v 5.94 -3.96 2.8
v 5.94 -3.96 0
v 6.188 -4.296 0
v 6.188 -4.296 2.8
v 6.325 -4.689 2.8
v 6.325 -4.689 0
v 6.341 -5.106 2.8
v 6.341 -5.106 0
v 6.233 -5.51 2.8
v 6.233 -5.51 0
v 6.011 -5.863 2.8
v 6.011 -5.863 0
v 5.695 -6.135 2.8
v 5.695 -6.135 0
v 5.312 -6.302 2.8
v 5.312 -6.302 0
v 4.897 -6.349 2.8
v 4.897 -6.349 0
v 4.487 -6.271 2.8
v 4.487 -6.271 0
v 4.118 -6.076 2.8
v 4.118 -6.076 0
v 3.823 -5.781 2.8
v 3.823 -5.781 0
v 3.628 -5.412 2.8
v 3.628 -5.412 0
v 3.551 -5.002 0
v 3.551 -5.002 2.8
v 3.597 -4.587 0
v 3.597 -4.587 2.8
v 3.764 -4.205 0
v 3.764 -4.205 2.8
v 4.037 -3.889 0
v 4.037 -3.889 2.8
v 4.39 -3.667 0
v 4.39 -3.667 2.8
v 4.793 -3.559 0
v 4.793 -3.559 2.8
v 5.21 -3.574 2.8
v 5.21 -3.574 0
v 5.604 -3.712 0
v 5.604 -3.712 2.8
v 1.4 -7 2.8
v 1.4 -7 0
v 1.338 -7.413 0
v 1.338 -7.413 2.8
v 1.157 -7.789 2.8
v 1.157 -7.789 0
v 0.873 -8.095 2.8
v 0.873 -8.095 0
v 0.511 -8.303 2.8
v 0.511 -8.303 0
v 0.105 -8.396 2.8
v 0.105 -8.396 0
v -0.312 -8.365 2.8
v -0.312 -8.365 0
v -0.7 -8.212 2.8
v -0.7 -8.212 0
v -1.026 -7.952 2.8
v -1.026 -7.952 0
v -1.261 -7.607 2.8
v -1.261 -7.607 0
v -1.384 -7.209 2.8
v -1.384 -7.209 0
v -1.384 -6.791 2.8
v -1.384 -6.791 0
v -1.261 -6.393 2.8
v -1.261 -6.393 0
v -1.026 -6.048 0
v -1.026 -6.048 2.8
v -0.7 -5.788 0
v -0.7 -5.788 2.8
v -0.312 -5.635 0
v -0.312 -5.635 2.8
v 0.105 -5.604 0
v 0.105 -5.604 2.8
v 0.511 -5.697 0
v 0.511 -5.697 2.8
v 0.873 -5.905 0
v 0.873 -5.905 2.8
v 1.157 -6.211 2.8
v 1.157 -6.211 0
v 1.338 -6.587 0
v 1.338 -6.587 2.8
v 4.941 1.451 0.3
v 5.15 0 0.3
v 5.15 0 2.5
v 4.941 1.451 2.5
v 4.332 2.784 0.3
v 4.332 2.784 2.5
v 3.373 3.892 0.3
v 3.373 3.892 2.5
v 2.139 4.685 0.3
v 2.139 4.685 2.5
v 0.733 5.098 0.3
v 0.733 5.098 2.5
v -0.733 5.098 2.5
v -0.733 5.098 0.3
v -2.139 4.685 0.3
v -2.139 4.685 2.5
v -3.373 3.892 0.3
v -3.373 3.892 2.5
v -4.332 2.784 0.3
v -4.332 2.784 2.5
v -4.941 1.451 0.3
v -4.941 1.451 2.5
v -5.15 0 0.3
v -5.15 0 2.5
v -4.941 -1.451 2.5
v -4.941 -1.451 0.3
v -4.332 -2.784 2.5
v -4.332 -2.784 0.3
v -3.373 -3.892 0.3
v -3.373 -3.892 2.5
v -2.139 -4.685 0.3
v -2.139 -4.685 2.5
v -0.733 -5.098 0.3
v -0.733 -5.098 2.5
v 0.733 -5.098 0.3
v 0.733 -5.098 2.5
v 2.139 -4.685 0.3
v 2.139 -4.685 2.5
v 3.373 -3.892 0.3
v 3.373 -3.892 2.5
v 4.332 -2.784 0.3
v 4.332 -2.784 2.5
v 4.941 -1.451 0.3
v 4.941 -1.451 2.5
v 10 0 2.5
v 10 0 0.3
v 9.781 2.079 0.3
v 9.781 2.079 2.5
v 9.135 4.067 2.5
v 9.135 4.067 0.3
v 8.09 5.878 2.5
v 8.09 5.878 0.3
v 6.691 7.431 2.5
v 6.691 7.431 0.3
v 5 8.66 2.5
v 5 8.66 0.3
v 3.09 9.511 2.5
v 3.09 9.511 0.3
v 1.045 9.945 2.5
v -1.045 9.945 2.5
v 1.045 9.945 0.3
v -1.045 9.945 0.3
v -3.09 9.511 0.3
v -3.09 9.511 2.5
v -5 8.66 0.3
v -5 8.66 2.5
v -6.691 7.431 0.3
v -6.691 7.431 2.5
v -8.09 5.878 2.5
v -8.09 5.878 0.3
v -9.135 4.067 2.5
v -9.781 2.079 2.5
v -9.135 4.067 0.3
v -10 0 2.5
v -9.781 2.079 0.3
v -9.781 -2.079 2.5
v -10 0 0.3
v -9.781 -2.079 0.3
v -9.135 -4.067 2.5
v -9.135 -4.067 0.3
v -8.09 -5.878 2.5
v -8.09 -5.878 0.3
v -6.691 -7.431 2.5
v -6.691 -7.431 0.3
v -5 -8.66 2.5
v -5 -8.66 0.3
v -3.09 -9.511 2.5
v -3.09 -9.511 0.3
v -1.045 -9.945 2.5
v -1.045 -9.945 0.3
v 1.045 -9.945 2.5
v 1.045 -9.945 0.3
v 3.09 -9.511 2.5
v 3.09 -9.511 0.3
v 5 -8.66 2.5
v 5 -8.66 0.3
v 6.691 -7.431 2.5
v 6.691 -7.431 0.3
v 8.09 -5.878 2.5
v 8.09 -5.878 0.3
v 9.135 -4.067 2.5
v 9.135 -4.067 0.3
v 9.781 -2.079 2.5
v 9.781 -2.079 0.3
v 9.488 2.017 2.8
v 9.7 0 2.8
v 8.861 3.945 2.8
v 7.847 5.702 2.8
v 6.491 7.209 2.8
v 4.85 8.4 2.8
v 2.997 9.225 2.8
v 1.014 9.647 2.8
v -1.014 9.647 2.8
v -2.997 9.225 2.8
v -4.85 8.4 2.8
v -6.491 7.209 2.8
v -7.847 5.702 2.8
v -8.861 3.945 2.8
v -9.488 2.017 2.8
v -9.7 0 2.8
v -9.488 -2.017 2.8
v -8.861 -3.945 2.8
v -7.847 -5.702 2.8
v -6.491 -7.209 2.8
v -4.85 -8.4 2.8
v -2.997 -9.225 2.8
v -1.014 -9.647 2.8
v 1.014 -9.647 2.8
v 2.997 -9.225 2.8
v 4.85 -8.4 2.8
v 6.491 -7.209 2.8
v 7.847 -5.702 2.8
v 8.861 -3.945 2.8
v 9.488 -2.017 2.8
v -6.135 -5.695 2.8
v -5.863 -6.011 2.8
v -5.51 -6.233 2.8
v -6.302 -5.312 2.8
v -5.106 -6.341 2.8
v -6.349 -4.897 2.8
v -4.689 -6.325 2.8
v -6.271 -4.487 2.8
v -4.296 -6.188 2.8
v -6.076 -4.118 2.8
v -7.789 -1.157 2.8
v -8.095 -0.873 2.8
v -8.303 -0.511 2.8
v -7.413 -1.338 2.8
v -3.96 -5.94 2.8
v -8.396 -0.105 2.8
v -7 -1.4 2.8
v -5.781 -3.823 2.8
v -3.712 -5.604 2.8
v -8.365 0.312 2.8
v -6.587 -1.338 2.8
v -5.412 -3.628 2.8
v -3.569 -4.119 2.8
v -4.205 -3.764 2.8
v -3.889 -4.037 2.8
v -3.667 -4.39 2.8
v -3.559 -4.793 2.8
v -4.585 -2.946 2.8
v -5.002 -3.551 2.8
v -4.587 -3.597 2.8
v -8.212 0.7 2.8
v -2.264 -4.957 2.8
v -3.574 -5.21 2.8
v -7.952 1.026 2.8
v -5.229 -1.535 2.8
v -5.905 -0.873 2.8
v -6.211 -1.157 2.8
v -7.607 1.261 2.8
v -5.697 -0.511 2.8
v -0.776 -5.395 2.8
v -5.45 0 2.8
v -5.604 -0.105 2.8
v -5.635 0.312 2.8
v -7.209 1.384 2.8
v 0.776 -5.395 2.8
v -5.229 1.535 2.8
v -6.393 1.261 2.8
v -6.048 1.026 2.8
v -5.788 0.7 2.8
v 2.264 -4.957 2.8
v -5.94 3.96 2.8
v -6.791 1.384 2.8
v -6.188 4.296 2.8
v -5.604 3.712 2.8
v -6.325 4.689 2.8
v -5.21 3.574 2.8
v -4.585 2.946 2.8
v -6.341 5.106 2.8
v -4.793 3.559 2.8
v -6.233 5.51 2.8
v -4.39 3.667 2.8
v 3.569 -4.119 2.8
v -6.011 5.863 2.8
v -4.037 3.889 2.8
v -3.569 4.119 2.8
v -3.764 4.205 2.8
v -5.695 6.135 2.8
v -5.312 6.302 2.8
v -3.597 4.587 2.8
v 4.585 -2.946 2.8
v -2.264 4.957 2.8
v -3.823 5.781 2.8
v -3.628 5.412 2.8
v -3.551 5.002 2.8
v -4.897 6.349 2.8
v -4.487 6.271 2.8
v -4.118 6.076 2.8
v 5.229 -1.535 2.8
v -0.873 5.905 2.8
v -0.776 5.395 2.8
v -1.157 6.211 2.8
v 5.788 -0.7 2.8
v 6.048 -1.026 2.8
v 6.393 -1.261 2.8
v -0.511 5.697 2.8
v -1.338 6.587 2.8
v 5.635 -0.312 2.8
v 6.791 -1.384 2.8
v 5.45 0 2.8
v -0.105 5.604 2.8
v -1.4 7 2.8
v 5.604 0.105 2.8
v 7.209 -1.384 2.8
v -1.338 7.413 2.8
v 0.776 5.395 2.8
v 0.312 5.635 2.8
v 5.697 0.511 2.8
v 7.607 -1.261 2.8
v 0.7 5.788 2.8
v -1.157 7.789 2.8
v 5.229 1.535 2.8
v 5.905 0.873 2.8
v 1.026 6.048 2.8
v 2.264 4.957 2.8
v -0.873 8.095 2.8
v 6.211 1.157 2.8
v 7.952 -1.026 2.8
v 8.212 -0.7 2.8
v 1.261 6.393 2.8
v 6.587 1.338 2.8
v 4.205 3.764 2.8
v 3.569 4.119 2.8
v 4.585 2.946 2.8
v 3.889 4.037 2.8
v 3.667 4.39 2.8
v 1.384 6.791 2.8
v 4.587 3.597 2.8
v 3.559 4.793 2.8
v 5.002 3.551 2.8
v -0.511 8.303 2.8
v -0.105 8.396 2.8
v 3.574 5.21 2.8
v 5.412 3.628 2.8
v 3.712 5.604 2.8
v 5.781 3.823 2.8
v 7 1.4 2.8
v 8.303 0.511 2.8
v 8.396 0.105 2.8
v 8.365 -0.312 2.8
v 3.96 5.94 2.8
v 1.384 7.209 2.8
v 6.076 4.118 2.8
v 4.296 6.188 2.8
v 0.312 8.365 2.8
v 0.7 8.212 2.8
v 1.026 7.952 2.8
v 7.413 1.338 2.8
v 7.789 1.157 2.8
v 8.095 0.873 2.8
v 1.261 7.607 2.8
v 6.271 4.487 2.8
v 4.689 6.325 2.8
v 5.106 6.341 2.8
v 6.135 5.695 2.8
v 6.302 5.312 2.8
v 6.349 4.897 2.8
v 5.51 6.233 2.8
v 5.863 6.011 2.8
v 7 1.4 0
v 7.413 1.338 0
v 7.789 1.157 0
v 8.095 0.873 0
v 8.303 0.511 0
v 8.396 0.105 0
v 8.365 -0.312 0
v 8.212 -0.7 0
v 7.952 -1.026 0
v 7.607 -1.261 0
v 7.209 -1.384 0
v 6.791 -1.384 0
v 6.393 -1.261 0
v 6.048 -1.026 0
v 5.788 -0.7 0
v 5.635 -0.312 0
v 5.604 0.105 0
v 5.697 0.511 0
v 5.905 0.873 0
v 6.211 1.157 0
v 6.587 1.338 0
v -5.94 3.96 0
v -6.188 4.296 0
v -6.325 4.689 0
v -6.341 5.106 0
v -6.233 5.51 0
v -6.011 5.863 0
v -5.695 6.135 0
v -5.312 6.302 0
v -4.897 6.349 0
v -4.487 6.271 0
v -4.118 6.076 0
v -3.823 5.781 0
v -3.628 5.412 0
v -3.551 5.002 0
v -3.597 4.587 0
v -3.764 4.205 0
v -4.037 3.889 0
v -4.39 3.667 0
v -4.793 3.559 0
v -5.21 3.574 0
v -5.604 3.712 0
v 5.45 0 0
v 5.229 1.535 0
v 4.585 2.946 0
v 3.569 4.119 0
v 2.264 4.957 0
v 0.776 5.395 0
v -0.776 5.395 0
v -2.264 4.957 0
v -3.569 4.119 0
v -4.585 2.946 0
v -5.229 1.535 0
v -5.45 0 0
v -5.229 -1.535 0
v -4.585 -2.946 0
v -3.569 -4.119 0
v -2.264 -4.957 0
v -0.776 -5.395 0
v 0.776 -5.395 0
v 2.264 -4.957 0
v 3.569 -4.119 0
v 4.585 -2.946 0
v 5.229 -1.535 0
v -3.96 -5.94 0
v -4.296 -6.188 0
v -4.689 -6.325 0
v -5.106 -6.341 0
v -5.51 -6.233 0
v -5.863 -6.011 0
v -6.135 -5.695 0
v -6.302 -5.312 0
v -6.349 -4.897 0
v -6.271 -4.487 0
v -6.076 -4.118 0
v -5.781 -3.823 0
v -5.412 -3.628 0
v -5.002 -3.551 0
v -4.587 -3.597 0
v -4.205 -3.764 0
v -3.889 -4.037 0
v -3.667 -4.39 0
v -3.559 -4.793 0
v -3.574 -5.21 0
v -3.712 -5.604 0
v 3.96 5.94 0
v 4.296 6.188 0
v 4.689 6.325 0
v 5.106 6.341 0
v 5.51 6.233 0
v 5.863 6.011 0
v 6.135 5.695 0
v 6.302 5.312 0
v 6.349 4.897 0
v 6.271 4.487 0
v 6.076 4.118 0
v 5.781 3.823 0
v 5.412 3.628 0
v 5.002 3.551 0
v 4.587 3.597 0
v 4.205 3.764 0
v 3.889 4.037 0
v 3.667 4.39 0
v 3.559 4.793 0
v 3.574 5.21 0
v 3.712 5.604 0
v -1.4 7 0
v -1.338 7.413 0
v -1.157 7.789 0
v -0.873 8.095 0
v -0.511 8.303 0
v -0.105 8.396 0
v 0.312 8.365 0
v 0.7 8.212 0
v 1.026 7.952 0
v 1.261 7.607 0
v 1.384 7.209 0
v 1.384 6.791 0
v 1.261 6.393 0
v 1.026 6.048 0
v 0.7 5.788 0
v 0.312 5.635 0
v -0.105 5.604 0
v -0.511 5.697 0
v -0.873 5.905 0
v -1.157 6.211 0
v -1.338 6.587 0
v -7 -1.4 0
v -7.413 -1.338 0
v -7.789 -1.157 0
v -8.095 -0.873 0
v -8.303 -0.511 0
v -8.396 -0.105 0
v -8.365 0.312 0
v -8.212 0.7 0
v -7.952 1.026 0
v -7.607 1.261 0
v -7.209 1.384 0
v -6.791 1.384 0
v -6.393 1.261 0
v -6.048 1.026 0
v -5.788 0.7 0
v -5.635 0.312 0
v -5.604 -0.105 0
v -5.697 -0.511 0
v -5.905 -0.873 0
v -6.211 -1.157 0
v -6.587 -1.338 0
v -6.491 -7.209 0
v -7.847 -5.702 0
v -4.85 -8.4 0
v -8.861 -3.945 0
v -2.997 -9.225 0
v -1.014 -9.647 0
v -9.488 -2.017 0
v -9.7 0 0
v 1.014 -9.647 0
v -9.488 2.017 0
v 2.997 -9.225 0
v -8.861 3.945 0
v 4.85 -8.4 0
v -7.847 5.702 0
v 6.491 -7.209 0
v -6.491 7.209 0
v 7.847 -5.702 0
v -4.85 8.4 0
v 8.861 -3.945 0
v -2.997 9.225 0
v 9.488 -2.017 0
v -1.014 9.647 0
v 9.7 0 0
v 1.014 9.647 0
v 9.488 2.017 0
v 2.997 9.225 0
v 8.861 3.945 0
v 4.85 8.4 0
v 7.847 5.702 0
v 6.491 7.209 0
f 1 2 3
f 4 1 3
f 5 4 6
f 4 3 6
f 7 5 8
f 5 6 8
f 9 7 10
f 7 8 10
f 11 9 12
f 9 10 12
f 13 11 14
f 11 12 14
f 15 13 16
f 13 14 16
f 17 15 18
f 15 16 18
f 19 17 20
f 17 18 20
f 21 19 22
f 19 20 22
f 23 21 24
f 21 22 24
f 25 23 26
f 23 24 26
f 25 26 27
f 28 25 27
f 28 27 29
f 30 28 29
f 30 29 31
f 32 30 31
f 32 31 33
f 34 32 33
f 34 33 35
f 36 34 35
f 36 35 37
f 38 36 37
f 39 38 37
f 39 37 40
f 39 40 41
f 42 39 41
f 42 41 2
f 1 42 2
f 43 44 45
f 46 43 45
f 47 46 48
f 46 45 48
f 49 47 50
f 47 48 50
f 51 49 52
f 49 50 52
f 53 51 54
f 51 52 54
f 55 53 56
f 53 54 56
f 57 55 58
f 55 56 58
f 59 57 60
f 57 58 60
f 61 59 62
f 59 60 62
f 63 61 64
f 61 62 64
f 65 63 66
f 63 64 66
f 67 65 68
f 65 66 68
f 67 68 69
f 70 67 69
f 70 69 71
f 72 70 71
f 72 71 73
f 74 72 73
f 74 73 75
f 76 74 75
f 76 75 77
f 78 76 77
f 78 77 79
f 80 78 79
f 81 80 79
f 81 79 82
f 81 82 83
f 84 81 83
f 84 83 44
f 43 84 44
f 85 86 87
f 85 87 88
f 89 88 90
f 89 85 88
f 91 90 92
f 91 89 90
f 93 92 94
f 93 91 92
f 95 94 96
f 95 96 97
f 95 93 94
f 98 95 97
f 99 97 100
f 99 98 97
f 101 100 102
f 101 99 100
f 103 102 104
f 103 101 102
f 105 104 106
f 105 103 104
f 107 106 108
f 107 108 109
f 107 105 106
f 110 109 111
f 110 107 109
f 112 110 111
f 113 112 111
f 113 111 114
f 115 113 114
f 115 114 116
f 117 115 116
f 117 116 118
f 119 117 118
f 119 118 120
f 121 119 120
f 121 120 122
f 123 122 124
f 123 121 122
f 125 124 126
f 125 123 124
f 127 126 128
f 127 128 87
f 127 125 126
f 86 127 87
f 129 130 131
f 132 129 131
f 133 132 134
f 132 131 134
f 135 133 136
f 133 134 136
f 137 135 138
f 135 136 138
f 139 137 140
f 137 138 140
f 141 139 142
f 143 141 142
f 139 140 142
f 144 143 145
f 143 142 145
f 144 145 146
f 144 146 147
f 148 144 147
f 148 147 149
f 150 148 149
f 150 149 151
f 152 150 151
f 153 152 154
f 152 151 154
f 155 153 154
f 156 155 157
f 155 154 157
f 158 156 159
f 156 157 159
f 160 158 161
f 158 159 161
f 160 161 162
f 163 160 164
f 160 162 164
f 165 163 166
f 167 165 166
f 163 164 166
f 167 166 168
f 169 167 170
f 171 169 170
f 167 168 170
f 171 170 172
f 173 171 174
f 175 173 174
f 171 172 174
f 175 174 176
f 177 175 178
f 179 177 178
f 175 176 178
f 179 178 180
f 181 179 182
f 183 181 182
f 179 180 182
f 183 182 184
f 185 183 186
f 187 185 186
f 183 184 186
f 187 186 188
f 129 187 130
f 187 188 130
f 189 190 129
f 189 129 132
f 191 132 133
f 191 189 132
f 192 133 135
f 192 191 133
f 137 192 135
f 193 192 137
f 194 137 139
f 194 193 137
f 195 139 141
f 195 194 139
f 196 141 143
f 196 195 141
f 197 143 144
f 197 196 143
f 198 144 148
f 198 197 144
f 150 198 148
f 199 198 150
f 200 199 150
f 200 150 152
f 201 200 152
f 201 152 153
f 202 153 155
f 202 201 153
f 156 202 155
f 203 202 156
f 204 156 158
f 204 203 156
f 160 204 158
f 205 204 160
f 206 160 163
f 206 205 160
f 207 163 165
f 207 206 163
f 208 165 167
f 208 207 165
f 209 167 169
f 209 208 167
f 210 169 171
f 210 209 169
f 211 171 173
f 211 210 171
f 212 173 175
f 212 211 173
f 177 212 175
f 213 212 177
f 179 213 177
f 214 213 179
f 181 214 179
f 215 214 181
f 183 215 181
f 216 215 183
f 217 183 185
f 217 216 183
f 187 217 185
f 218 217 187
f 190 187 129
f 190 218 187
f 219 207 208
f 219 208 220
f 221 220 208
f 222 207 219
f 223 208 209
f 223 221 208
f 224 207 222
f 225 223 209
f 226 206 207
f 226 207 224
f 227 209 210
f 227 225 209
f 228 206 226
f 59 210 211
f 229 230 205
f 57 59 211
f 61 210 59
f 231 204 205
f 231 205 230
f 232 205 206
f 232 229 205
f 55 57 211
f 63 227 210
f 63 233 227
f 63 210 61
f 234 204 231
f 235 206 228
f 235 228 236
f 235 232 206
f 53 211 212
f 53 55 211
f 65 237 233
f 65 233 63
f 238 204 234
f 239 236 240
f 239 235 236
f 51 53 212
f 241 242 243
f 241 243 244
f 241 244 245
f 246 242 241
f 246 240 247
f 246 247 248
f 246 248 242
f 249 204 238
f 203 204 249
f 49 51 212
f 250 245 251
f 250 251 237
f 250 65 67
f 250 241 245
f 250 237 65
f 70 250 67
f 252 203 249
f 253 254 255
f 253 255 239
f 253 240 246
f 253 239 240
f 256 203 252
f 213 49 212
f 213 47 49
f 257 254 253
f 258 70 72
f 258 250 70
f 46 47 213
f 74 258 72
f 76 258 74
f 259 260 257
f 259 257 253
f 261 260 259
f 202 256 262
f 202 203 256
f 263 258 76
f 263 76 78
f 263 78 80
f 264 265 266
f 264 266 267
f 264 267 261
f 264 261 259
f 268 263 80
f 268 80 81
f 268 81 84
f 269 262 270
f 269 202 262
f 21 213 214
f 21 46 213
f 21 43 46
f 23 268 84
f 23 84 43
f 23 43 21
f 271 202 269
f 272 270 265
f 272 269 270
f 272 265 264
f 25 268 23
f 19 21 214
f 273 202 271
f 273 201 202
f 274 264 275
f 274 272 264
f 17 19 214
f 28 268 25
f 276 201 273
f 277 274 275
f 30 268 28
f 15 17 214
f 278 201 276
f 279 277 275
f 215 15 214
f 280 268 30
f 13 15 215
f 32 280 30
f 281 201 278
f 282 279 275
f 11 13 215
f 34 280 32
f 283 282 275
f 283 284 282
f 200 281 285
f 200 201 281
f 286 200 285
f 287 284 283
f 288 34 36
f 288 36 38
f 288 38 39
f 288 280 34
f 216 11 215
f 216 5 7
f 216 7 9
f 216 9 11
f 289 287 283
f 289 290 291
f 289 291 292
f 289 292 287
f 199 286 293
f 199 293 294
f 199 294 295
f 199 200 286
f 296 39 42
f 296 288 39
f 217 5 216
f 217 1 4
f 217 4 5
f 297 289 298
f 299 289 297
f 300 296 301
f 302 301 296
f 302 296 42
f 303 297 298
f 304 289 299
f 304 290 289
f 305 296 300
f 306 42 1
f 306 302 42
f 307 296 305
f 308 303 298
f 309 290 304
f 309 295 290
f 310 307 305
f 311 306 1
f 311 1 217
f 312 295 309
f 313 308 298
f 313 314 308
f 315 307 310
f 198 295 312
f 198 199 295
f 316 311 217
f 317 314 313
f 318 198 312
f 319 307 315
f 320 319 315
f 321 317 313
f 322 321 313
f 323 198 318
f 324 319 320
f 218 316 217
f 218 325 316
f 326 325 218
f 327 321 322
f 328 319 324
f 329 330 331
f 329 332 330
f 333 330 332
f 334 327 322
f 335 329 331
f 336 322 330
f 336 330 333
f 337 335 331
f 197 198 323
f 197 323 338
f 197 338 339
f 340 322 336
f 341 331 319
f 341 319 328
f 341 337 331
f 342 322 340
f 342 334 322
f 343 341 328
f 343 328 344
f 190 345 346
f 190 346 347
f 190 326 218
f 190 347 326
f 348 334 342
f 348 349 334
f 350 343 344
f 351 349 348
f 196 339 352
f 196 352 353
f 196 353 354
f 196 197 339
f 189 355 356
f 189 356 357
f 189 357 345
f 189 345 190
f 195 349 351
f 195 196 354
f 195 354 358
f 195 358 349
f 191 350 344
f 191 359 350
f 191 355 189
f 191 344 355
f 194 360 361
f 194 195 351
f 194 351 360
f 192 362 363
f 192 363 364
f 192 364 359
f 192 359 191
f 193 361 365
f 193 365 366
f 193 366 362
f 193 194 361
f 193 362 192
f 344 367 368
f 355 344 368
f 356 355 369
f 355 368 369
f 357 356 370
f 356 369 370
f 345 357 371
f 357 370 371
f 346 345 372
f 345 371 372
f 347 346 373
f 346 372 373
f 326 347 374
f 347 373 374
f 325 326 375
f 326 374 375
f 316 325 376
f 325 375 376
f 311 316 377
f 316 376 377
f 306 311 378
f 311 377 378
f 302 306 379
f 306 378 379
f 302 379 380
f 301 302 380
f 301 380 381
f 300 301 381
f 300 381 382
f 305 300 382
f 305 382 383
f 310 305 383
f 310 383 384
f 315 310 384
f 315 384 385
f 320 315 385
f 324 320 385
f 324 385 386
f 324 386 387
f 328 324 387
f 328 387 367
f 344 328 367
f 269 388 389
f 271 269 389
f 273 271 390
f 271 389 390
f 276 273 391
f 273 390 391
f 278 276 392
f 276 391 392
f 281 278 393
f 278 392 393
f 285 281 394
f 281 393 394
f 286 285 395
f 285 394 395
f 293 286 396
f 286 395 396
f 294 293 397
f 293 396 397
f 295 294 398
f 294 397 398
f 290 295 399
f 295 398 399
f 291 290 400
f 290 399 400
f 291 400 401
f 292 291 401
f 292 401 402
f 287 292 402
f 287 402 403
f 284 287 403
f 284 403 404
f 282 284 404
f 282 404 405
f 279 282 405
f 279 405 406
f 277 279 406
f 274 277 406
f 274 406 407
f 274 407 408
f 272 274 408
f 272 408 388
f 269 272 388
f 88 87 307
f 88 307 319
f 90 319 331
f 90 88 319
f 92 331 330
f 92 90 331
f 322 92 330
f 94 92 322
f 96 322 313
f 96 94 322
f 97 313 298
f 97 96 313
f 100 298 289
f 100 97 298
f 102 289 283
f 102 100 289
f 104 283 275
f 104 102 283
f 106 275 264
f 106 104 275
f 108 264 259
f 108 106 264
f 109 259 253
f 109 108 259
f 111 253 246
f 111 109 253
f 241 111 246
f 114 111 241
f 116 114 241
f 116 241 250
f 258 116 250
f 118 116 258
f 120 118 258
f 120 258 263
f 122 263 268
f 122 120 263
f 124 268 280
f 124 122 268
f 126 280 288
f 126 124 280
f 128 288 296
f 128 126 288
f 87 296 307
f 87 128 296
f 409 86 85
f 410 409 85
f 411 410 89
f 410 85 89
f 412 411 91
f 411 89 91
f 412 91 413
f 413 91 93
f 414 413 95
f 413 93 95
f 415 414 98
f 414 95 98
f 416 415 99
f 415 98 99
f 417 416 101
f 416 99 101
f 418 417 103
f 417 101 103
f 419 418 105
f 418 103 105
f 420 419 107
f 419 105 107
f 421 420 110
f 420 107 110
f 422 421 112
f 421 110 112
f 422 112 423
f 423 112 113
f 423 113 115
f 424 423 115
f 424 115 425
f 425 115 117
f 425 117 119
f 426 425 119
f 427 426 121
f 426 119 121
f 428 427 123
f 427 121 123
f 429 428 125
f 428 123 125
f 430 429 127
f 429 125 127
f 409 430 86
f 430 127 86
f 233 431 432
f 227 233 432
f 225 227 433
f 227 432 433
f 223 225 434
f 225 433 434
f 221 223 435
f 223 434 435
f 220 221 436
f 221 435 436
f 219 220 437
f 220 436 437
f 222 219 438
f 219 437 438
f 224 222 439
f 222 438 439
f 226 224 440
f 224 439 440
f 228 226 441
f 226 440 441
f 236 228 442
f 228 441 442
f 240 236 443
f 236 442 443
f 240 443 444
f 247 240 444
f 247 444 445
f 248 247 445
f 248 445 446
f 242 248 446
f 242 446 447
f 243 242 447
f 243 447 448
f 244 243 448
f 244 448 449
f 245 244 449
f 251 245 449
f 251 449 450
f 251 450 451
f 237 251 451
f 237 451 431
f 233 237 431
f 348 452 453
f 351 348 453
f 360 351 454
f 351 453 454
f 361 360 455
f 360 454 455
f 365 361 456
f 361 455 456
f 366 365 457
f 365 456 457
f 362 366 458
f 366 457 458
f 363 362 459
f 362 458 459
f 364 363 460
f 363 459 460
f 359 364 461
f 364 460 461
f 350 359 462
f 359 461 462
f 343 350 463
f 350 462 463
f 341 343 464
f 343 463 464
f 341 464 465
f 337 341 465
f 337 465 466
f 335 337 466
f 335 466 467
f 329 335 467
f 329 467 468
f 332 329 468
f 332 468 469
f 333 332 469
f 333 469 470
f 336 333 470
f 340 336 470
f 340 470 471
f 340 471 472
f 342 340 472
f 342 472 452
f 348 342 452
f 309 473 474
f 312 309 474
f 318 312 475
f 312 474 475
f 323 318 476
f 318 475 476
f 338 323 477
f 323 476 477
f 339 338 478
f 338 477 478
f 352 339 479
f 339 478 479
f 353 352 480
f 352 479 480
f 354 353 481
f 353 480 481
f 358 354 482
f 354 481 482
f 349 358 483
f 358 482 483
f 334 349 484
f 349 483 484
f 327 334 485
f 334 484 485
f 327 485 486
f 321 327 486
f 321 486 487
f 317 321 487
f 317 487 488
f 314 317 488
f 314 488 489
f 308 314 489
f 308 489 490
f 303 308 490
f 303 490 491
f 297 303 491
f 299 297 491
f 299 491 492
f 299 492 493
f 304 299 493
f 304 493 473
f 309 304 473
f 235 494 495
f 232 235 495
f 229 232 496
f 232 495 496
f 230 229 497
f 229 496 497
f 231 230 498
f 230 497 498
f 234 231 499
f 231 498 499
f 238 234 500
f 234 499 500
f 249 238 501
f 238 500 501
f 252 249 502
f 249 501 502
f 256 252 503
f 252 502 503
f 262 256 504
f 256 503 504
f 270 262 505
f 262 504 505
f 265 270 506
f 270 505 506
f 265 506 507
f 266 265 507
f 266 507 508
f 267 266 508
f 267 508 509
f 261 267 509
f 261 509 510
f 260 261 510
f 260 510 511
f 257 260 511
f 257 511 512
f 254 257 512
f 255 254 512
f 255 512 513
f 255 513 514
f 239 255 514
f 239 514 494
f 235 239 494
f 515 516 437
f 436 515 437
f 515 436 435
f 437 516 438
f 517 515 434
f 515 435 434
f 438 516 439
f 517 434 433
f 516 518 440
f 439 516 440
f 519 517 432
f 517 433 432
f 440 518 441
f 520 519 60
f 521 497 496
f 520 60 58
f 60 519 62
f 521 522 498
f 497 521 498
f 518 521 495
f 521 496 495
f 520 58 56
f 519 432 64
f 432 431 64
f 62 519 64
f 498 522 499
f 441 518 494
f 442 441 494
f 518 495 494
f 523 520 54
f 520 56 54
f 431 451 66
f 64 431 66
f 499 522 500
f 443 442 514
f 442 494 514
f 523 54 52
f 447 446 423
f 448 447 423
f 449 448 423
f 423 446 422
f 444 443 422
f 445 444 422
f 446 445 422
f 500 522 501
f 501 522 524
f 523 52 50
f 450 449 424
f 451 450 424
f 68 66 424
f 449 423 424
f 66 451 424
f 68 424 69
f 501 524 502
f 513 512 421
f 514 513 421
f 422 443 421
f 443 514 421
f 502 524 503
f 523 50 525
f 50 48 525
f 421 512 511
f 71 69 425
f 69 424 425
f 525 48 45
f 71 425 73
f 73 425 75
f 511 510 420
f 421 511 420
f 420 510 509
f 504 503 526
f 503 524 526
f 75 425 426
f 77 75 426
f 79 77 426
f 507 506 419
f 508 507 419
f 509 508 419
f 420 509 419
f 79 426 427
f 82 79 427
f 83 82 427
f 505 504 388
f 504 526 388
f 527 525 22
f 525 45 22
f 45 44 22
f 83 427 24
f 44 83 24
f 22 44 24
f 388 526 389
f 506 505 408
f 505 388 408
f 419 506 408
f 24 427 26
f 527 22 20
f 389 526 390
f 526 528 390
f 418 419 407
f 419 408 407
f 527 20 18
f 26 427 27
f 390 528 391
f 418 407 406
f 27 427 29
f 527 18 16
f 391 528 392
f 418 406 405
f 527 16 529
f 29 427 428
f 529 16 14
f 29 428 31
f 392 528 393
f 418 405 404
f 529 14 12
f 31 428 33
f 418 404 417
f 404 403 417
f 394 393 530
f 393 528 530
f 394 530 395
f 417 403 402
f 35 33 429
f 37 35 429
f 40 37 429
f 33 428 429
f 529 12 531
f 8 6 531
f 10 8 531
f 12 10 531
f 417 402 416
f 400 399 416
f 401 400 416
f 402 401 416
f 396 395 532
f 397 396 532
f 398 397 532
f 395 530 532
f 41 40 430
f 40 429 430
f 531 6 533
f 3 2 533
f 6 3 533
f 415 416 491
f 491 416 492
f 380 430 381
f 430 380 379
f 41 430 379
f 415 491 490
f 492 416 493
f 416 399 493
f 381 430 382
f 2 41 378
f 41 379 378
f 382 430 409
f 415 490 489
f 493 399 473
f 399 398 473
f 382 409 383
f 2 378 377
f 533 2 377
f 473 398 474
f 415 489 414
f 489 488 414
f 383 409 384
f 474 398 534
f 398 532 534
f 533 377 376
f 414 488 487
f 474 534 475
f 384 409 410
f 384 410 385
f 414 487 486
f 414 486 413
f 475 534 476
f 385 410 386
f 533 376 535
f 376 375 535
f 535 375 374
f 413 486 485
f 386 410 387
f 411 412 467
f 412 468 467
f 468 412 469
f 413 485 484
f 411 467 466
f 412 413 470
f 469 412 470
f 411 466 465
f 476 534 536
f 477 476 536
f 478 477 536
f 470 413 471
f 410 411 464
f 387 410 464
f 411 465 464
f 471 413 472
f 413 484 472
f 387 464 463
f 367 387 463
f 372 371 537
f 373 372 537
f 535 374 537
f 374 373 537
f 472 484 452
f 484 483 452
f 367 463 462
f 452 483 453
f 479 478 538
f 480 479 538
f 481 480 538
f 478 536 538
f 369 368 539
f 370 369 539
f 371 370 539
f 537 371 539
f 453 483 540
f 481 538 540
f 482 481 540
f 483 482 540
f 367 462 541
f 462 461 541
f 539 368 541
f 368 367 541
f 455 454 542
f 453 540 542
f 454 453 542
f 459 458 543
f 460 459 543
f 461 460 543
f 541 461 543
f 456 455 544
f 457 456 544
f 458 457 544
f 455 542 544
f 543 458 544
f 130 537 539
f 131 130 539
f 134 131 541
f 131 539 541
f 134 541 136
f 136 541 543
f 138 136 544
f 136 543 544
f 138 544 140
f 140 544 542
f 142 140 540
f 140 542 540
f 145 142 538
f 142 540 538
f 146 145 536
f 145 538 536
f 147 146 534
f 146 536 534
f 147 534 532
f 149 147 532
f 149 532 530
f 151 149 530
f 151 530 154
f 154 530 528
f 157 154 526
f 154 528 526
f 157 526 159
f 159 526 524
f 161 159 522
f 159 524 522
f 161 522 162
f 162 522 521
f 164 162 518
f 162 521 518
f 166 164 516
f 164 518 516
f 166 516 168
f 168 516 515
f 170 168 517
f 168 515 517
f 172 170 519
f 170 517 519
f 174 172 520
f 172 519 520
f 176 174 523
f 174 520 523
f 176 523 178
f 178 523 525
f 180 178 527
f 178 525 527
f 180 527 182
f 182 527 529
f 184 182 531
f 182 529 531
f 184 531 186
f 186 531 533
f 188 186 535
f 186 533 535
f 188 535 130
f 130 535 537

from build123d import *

# Parameters (mm, degrees)
F0_R            = 10
F0_R_2          = 5.15
F1_DEPTH        = 2.8
F3_D            = 2.8
F3_COPIES_COUNT = 8
F4_SIZE         = 0.3


# Not quite as in the source:
# - a pattern or mirror of a feature is missing from the dataset's text; its kind, count and spacing are read off the source's solid


with BuildPart() as f1:
    # F0 (on Top) → F1 (new body)
    with BuildSketch(Plane.XY):
        Circle(F0_R)
        Circle(F0_R_2, mode=Mode.SUBTRACT)
    extrude(amount=F1_DEPTH)

    # F3 (through all)
    with Locations(Plane.XY.offset(2.8)):
        with Locations((0, 7)):
            f3 = Hole(F3_D / 2)

    # F3_copies: F3 ×8 about axis
    f3_copies_axis = Axis((0, 0, 0), (0, 0, 1))
    for i in range(1, F3_COPIES_COUNT):
        add(f3.rotate(f3_copies_axis, i * 360 / F3_COPIES_COUNT), mode=Mode.SUBTRACT)

    # F4
    f4_edges = [f1.edges().sort_by_distance(p)[0] for p in [
        (-5.15, 0, 0),
        (-10, 0, 0),
        (-5.15, 0, 2.8),
        (-10, 0, 2.8),
    ]]
    chamfer(f4_edges, length=F4_SIZE)


solid = f1.part
